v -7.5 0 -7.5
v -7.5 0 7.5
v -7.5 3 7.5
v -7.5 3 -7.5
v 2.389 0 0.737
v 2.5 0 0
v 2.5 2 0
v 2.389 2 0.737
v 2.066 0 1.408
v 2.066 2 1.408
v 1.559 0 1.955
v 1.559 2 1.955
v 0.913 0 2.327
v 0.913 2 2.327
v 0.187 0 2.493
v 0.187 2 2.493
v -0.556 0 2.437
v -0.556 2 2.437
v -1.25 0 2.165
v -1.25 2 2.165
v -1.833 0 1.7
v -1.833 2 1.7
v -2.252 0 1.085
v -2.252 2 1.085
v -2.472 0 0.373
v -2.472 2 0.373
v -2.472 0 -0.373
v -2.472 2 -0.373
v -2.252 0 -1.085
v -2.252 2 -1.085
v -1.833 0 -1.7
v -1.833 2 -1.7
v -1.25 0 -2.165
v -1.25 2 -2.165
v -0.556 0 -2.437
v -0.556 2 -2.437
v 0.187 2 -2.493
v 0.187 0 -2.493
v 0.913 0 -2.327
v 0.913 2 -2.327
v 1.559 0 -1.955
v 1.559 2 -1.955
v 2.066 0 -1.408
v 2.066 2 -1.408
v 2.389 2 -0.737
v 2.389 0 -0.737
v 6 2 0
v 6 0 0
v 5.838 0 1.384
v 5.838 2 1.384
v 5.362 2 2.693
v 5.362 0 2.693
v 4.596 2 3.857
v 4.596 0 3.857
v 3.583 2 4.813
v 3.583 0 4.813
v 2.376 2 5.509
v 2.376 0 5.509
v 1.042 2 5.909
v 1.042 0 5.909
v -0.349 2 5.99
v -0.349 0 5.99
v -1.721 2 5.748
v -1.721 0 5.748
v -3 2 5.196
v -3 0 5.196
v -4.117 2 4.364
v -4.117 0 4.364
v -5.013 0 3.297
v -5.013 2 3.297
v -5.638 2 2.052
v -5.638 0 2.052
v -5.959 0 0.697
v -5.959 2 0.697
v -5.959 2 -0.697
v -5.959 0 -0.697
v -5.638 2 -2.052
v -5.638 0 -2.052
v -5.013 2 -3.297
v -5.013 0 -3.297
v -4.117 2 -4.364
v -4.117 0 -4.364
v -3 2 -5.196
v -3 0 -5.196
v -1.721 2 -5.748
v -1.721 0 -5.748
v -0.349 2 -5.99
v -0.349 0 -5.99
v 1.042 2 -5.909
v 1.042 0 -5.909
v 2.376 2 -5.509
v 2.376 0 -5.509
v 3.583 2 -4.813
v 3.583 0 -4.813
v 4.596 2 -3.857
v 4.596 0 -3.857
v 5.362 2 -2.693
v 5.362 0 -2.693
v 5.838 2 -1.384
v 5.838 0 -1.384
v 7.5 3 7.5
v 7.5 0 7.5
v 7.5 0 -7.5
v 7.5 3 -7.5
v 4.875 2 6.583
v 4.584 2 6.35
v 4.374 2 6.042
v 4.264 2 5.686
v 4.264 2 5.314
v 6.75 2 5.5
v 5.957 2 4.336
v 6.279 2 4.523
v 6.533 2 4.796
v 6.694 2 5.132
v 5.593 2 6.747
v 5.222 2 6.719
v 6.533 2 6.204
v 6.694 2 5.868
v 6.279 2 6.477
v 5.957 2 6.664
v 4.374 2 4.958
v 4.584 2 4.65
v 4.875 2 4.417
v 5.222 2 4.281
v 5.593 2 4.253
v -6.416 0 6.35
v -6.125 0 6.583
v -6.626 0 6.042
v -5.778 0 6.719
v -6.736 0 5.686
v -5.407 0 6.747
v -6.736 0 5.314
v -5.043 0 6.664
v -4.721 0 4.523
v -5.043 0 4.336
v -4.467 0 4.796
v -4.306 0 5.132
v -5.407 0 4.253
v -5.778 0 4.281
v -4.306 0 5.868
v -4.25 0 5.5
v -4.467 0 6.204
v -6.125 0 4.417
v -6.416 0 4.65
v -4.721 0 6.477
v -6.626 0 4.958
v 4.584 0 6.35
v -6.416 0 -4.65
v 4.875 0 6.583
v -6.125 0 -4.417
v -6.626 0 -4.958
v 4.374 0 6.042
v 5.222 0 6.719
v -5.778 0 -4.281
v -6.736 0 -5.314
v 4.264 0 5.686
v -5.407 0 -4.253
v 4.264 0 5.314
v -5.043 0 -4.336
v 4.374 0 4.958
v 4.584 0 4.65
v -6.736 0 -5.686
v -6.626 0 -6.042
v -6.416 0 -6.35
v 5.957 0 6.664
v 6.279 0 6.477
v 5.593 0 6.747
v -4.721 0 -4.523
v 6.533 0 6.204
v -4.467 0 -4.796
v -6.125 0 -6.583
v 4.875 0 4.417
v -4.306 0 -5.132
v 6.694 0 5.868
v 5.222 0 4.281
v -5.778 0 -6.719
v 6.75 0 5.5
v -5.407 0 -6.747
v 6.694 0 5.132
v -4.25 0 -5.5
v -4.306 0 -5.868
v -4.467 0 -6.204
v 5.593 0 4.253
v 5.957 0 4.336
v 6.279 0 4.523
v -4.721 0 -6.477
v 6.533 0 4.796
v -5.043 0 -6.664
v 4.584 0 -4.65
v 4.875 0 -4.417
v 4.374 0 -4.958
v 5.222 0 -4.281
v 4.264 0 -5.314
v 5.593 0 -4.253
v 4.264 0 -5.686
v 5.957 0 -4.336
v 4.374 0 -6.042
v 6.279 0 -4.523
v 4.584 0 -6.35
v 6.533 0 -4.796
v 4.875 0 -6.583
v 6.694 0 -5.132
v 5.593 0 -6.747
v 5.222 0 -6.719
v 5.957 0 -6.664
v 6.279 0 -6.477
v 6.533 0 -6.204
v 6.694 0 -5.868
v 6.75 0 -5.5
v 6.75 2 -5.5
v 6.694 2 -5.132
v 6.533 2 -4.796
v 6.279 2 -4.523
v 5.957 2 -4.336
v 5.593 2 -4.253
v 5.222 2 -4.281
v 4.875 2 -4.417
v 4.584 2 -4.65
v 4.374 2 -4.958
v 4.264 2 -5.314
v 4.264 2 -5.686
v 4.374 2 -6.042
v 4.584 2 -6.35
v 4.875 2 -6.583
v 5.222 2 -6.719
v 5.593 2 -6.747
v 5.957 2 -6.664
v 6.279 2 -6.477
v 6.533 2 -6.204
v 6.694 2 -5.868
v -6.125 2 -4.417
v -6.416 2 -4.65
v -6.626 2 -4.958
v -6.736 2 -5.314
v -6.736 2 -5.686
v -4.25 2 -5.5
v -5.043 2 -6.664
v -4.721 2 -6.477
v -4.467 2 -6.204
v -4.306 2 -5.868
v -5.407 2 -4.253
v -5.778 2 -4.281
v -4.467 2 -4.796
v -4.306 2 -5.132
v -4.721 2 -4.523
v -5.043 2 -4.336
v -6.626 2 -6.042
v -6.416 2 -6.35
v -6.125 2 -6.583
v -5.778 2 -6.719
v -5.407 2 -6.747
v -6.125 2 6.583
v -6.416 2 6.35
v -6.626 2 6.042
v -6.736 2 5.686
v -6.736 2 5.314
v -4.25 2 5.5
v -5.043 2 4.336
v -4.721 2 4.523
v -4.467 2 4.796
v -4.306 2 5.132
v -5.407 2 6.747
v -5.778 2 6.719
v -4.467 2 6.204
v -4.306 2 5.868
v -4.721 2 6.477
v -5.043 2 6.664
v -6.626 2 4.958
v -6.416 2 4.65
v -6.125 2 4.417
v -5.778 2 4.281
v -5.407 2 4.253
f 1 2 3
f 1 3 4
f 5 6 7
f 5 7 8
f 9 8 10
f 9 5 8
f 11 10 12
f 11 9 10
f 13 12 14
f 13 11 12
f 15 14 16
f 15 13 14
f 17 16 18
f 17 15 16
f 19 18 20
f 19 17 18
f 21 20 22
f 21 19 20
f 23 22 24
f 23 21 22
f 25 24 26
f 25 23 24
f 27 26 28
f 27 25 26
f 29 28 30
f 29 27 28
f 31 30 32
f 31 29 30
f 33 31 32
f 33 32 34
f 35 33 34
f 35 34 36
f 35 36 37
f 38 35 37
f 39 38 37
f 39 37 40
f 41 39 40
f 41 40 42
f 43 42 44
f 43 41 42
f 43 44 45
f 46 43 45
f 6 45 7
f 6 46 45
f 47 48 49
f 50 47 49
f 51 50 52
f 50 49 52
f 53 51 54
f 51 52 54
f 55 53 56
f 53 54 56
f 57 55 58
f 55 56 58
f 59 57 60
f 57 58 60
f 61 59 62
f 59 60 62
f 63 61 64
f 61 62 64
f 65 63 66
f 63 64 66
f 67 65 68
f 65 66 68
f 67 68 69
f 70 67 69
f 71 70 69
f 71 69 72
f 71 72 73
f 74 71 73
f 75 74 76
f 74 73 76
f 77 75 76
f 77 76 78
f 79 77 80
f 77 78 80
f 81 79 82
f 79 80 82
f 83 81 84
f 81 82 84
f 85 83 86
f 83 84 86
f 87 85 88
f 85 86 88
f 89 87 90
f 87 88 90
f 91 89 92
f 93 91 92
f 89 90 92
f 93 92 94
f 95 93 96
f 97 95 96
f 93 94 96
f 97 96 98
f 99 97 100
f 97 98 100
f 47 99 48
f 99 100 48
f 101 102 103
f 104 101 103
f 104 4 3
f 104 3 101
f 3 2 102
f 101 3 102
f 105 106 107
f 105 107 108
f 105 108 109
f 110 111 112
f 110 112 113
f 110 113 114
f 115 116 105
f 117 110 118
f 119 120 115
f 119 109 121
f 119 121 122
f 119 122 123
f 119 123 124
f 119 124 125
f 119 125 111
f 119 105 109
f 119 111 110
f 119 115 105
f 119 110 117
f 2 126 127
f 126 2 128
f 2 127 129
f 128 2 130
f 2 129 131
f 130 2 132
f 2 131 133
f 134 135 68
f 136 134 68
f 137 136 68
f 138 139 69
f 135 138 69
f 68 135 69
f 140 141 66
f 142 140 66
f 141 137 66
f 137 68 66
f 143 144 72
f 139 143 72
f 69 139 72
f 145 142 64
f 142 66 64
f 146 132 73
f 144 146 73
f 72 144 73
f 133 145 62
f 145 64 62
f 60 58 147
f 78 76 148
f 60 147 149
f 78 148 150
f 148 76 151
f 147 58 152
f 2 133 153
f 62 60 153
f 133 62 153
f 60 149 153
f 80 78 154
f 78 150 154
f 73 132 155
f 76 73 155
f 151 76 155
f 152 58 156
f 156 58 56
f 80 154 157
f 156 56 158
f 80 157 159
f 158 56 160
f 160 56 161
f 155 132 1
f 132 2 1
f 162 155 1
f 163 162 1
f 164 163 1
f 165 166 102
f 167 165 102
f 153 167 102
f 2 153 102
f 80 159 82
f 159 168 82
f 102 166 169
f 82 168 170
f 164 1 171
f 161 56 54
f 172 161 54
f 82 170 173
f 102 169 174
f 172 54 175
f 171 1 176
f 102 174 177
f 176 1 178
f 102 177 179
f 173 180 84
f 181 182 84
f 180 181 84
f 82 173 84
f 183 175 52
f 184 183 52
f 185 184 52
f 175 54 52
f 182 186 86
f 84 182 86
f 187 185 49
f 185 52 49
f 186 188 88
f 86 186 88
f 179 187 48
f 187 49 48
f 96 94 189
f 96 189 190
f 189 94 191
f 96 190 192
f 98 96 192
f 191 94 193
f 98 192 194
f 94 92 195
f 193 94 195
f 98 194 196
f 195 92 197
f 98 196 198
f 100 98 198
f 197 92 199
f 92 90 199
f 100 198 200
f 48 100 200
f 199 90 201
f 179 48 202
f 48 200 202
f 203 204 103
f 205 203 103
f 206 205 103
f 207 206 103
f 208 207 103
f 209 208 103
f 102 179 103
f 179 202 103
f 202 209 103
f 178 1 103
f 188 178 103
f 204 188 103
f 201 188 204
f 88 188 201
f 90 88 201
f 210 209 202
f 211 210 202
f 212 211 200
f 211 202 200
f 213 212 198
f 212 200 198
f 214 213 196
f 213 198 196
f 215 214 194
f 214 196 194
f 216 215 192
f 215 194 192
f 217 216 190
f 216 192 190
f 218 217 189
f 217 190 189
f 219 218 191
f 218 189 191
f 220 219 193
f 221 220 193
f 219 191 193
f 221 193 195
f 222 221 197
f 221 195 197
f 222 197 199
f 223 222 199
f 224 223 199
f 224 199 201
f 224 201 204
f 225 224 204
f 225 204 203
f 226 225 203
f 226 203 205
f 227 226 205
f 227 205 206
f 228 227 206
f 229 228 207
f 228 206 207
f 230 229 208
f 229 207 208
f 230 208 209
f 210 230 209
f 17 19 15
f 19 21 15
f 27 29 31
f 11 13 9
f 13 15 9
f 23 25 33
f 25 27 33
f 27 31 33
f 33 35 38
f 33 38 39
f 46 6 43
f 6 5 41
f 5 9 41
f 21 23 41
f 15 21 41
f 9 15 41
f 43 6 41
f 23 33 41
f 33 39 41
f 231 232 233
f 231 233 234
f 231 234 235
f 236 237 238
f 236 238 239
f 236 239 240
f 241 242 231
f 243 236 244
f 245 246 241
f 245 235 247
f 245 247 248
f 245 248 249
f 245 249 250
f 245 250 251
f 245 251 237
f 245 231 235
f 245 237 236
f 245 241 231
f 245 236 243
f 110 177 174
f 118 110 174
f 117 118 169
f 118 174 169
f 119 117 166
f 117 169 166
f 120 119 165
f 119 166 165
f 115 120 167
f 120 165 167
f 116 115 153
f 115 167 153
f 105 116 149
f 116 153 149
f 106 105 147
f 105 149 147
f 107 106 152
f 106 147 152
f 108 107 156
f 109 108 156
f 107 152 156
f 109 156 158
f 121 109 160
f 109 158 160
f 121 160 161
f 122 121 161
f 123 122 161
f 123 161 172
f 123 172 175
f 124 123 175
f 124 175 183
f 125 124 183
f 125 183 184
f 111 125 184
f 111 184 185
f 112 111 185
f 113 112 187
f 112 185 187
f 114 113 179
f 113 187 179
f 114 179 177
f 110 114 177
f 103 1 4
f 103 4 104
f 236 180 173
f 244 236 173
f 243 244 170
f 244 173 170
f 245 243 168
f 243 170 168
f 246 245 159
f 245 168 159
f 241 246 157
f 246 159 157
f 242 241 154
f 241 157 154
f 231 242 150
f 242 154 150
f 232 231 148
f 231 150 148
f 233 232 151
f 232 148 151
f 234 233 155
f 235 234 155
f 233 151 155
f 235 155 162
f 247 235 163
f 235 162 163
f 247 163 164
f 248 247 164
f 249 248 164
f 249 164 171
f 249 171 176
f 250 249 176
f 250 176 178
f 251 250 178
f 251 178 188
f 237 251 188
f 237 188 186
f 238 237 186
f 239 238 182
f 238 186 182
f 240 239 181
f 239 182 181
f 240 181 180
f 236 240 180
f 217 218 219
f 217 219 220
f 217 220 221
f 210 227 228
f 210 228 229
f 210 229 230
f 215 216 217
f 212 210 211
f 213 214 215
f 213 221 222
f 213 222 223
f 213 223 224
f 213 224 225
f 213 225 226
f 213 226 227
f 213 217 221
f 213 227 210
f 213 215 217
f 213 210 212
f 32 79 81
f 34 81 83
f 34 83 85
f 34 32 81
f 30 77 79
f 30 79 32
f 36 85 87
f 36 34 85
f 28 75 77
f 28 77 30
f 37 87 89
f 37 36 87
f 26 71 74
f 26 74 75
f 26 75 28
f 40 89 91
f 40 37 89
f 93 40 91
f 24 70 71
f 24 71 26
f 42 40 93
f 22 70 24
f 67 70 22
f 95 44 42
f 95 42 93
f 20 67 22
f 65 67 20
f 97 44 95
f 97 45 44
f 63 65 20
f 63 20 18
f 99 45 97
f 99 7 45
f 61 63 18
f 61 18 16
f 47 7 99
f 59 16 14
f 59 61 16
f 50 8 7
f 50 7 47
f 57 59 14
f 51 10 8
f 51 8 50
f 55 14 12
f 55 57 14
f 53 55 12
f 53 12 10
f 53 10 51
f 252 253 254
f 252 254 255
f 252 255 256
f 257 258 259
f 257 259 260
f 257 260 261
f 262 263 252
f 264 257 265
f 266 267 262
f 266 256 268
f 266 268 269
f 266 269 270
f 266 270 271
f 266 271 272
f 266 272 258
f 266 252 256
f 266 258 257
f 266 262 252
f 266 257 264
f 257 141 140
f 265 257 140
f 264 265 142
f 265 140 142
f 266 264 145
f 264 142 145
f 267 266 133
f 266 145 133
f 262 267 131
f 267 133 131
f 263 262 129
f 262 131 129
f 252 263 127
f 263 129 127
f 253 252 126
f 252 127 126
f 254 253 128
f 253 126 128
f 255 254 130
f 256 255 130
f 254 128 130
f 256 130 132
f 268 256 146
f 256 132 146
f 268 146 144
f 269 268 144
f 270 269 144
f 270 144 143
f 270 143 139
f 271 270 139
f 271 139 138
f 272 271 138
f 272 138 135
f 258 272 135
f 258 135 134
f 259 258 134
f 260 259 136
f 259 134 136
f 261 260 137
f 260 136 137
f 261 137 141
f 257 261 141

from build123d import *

# Parameters (mm, degrees)
SKETCH1_W           = 15
SKETCH1_H           = 15
BOSS_EXTRUDE1_DEPTH = 3
SKETCH2_R           = 6
SKETCH2_R_2         = 2.5
CUT_EXTRUDE1_DEPTH  = 2
SKETCH3_R           = 1.25
CUT_EXTRUDE2_DEPTH  = 2


with BuildPart() as part:
    # Sketch1 → Boss-Extrude1 (new body)
    with BuildSketch(Plane(origin=(0, 0, 0), x_dir=(1, 0, 0), z_dir=(0, 1, 0))):
        Rectangle(SKETCH1_W, SKETCH1_H)
    extrude(amount=BOSS_EXTRUDE1_DEPTH)

    # Sketch2 → Cut-Extrude1 (cut)
    with BuildSketch(Plane.XZ):
        Circle(SKETCH2_R)
        Circle(SKETCH2_R_2, mode=Mode.SUBTRACT)
    extrude(amount=-CUT_EXTRUDE1_DEPTH, mode=Mode.SUBTRACT)

    # Sketch3 → Cut-Extrude2 (cut)
    with BuildSketch(Plane.XZ):
        with Locations((5.5, 5.5)):
            Circle(SKETCH3_R)
        with Locations((-5.5, 5.5)):
            Circle(SKETCH3_R)
        with Locations((-5.5, -5.5)):
            Circle(SKETCH3_R)
        with Locations((5.5, -5.5)):
            Circle(SKETCH3_R)
    extrude(amount=-CUT_EXTRUDE2_DEPTH, mode=Mode.SUBTRACT)


solid = part.part
